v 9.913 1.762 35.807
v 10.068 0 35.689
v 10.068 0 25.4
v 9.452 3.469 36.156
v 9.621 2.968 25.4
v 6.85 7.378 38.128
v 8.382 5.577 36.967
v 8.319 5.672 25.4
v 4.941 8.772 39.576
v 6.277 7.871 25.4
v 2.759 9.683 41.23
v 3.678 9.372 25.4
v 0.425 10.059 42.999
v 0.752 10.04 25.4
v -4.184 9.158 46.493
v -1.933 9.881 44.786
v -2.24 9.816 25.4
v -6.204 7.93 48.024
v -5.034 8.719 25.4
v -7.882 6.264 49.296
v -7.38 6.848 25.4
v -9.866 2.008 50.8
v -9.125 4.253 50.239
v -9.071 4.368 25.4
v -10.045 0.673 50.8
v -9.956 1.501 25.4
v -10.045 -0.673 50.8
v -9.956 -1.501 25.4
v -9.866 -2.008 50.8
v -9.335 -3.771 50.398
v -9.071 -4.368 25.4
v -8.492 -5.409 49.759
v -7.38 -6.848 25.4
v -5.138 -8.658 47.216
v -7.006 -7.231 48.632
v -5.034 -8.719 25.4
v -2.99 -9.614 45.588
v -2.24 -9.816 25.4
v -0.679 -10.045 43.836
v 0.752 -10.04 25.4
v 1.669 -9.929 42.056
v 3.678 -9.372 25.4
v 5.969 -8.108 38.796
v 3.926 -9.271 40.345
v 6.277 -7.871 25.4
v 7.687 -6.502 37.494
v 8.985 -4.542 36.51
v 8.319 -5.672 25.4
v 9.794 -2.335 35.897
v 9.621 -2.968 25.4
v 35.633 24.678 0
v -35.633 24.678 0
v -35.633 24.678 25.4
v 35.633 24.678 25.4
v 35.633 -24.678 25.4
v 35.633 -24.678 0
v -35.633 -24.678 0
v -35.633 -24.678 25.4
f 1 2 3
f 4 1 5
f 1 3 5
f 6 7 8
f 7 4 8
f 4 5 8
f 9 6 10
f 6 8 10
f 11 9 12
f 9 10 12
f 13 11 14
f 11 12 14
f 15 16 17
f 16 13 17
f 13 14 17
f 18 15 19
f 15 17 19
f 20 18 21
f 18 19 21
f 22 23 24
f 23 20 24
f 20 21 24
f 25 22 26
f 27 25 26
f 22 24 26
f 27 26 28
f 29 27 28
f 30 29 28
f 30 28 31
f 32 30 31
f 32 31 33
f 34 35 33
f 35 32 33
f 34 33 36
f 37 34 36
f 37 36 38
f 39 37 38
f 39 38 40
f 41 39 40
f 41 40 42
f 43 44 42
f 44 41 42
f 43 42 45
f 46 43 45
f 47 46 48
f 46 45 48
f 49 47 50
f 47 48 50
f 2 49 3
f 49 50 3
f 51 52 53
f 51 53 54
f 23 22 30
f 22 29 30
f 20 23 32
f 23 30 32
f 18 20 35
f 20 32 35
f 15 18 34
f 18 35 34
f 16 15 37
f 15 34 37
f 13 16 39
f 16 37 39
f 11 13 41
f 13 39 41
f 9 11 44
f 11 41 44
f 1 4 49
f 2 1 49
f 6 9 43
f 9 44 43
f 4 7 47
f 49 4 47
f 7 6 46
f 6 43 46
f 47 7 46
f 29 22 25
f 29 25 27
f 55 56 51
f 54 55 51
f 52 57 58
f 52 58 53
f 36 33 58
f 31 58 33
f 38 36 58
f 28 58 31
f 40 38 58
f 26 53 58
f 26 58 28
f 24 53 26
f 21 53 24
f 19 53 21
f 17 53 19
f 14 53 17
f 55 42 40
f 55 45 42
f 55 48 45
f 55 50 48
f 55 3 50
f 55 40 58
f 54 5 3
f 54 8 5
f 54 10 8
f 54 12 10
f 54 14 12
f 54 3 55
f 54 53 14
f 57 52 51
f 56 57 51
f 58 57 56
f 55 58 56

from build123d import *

# Parameters (mm, degrees)
F0_W     = 71.266532
F0_H     = 49.356132
F1_DEPTH = 25.4
F2_R     = 10.06801
F3_DEPTH = 25.4
F5_DEPTH = 46.228


with BuildPart() as f1:
    # F0 (on Top) → F1 (new body)
    with BuildSketch(Plane.XY):
        Rectangle(F0_W, F0_H)
    extrude(amount=F1_DEPTH)

    # F2 (on face) → F3 (join)
    with BuildSketch(Plane.XY.offset(25.4)):
        Circle(F2_R)
    extrude(amount=F3_DEPTH)

    # F4 (on face) → F5 (cut)
    with BuildSketch(Plane.XZ.offset(24.678066)):
        Polygon((15.782516, 50.946049), (-10.0584, 50.946049), (15.782516, 31.35702), align=None)
    extrude(amount=-F5_DEPTH, mode=Mode.SUBTRACT)


solid = f1.part
